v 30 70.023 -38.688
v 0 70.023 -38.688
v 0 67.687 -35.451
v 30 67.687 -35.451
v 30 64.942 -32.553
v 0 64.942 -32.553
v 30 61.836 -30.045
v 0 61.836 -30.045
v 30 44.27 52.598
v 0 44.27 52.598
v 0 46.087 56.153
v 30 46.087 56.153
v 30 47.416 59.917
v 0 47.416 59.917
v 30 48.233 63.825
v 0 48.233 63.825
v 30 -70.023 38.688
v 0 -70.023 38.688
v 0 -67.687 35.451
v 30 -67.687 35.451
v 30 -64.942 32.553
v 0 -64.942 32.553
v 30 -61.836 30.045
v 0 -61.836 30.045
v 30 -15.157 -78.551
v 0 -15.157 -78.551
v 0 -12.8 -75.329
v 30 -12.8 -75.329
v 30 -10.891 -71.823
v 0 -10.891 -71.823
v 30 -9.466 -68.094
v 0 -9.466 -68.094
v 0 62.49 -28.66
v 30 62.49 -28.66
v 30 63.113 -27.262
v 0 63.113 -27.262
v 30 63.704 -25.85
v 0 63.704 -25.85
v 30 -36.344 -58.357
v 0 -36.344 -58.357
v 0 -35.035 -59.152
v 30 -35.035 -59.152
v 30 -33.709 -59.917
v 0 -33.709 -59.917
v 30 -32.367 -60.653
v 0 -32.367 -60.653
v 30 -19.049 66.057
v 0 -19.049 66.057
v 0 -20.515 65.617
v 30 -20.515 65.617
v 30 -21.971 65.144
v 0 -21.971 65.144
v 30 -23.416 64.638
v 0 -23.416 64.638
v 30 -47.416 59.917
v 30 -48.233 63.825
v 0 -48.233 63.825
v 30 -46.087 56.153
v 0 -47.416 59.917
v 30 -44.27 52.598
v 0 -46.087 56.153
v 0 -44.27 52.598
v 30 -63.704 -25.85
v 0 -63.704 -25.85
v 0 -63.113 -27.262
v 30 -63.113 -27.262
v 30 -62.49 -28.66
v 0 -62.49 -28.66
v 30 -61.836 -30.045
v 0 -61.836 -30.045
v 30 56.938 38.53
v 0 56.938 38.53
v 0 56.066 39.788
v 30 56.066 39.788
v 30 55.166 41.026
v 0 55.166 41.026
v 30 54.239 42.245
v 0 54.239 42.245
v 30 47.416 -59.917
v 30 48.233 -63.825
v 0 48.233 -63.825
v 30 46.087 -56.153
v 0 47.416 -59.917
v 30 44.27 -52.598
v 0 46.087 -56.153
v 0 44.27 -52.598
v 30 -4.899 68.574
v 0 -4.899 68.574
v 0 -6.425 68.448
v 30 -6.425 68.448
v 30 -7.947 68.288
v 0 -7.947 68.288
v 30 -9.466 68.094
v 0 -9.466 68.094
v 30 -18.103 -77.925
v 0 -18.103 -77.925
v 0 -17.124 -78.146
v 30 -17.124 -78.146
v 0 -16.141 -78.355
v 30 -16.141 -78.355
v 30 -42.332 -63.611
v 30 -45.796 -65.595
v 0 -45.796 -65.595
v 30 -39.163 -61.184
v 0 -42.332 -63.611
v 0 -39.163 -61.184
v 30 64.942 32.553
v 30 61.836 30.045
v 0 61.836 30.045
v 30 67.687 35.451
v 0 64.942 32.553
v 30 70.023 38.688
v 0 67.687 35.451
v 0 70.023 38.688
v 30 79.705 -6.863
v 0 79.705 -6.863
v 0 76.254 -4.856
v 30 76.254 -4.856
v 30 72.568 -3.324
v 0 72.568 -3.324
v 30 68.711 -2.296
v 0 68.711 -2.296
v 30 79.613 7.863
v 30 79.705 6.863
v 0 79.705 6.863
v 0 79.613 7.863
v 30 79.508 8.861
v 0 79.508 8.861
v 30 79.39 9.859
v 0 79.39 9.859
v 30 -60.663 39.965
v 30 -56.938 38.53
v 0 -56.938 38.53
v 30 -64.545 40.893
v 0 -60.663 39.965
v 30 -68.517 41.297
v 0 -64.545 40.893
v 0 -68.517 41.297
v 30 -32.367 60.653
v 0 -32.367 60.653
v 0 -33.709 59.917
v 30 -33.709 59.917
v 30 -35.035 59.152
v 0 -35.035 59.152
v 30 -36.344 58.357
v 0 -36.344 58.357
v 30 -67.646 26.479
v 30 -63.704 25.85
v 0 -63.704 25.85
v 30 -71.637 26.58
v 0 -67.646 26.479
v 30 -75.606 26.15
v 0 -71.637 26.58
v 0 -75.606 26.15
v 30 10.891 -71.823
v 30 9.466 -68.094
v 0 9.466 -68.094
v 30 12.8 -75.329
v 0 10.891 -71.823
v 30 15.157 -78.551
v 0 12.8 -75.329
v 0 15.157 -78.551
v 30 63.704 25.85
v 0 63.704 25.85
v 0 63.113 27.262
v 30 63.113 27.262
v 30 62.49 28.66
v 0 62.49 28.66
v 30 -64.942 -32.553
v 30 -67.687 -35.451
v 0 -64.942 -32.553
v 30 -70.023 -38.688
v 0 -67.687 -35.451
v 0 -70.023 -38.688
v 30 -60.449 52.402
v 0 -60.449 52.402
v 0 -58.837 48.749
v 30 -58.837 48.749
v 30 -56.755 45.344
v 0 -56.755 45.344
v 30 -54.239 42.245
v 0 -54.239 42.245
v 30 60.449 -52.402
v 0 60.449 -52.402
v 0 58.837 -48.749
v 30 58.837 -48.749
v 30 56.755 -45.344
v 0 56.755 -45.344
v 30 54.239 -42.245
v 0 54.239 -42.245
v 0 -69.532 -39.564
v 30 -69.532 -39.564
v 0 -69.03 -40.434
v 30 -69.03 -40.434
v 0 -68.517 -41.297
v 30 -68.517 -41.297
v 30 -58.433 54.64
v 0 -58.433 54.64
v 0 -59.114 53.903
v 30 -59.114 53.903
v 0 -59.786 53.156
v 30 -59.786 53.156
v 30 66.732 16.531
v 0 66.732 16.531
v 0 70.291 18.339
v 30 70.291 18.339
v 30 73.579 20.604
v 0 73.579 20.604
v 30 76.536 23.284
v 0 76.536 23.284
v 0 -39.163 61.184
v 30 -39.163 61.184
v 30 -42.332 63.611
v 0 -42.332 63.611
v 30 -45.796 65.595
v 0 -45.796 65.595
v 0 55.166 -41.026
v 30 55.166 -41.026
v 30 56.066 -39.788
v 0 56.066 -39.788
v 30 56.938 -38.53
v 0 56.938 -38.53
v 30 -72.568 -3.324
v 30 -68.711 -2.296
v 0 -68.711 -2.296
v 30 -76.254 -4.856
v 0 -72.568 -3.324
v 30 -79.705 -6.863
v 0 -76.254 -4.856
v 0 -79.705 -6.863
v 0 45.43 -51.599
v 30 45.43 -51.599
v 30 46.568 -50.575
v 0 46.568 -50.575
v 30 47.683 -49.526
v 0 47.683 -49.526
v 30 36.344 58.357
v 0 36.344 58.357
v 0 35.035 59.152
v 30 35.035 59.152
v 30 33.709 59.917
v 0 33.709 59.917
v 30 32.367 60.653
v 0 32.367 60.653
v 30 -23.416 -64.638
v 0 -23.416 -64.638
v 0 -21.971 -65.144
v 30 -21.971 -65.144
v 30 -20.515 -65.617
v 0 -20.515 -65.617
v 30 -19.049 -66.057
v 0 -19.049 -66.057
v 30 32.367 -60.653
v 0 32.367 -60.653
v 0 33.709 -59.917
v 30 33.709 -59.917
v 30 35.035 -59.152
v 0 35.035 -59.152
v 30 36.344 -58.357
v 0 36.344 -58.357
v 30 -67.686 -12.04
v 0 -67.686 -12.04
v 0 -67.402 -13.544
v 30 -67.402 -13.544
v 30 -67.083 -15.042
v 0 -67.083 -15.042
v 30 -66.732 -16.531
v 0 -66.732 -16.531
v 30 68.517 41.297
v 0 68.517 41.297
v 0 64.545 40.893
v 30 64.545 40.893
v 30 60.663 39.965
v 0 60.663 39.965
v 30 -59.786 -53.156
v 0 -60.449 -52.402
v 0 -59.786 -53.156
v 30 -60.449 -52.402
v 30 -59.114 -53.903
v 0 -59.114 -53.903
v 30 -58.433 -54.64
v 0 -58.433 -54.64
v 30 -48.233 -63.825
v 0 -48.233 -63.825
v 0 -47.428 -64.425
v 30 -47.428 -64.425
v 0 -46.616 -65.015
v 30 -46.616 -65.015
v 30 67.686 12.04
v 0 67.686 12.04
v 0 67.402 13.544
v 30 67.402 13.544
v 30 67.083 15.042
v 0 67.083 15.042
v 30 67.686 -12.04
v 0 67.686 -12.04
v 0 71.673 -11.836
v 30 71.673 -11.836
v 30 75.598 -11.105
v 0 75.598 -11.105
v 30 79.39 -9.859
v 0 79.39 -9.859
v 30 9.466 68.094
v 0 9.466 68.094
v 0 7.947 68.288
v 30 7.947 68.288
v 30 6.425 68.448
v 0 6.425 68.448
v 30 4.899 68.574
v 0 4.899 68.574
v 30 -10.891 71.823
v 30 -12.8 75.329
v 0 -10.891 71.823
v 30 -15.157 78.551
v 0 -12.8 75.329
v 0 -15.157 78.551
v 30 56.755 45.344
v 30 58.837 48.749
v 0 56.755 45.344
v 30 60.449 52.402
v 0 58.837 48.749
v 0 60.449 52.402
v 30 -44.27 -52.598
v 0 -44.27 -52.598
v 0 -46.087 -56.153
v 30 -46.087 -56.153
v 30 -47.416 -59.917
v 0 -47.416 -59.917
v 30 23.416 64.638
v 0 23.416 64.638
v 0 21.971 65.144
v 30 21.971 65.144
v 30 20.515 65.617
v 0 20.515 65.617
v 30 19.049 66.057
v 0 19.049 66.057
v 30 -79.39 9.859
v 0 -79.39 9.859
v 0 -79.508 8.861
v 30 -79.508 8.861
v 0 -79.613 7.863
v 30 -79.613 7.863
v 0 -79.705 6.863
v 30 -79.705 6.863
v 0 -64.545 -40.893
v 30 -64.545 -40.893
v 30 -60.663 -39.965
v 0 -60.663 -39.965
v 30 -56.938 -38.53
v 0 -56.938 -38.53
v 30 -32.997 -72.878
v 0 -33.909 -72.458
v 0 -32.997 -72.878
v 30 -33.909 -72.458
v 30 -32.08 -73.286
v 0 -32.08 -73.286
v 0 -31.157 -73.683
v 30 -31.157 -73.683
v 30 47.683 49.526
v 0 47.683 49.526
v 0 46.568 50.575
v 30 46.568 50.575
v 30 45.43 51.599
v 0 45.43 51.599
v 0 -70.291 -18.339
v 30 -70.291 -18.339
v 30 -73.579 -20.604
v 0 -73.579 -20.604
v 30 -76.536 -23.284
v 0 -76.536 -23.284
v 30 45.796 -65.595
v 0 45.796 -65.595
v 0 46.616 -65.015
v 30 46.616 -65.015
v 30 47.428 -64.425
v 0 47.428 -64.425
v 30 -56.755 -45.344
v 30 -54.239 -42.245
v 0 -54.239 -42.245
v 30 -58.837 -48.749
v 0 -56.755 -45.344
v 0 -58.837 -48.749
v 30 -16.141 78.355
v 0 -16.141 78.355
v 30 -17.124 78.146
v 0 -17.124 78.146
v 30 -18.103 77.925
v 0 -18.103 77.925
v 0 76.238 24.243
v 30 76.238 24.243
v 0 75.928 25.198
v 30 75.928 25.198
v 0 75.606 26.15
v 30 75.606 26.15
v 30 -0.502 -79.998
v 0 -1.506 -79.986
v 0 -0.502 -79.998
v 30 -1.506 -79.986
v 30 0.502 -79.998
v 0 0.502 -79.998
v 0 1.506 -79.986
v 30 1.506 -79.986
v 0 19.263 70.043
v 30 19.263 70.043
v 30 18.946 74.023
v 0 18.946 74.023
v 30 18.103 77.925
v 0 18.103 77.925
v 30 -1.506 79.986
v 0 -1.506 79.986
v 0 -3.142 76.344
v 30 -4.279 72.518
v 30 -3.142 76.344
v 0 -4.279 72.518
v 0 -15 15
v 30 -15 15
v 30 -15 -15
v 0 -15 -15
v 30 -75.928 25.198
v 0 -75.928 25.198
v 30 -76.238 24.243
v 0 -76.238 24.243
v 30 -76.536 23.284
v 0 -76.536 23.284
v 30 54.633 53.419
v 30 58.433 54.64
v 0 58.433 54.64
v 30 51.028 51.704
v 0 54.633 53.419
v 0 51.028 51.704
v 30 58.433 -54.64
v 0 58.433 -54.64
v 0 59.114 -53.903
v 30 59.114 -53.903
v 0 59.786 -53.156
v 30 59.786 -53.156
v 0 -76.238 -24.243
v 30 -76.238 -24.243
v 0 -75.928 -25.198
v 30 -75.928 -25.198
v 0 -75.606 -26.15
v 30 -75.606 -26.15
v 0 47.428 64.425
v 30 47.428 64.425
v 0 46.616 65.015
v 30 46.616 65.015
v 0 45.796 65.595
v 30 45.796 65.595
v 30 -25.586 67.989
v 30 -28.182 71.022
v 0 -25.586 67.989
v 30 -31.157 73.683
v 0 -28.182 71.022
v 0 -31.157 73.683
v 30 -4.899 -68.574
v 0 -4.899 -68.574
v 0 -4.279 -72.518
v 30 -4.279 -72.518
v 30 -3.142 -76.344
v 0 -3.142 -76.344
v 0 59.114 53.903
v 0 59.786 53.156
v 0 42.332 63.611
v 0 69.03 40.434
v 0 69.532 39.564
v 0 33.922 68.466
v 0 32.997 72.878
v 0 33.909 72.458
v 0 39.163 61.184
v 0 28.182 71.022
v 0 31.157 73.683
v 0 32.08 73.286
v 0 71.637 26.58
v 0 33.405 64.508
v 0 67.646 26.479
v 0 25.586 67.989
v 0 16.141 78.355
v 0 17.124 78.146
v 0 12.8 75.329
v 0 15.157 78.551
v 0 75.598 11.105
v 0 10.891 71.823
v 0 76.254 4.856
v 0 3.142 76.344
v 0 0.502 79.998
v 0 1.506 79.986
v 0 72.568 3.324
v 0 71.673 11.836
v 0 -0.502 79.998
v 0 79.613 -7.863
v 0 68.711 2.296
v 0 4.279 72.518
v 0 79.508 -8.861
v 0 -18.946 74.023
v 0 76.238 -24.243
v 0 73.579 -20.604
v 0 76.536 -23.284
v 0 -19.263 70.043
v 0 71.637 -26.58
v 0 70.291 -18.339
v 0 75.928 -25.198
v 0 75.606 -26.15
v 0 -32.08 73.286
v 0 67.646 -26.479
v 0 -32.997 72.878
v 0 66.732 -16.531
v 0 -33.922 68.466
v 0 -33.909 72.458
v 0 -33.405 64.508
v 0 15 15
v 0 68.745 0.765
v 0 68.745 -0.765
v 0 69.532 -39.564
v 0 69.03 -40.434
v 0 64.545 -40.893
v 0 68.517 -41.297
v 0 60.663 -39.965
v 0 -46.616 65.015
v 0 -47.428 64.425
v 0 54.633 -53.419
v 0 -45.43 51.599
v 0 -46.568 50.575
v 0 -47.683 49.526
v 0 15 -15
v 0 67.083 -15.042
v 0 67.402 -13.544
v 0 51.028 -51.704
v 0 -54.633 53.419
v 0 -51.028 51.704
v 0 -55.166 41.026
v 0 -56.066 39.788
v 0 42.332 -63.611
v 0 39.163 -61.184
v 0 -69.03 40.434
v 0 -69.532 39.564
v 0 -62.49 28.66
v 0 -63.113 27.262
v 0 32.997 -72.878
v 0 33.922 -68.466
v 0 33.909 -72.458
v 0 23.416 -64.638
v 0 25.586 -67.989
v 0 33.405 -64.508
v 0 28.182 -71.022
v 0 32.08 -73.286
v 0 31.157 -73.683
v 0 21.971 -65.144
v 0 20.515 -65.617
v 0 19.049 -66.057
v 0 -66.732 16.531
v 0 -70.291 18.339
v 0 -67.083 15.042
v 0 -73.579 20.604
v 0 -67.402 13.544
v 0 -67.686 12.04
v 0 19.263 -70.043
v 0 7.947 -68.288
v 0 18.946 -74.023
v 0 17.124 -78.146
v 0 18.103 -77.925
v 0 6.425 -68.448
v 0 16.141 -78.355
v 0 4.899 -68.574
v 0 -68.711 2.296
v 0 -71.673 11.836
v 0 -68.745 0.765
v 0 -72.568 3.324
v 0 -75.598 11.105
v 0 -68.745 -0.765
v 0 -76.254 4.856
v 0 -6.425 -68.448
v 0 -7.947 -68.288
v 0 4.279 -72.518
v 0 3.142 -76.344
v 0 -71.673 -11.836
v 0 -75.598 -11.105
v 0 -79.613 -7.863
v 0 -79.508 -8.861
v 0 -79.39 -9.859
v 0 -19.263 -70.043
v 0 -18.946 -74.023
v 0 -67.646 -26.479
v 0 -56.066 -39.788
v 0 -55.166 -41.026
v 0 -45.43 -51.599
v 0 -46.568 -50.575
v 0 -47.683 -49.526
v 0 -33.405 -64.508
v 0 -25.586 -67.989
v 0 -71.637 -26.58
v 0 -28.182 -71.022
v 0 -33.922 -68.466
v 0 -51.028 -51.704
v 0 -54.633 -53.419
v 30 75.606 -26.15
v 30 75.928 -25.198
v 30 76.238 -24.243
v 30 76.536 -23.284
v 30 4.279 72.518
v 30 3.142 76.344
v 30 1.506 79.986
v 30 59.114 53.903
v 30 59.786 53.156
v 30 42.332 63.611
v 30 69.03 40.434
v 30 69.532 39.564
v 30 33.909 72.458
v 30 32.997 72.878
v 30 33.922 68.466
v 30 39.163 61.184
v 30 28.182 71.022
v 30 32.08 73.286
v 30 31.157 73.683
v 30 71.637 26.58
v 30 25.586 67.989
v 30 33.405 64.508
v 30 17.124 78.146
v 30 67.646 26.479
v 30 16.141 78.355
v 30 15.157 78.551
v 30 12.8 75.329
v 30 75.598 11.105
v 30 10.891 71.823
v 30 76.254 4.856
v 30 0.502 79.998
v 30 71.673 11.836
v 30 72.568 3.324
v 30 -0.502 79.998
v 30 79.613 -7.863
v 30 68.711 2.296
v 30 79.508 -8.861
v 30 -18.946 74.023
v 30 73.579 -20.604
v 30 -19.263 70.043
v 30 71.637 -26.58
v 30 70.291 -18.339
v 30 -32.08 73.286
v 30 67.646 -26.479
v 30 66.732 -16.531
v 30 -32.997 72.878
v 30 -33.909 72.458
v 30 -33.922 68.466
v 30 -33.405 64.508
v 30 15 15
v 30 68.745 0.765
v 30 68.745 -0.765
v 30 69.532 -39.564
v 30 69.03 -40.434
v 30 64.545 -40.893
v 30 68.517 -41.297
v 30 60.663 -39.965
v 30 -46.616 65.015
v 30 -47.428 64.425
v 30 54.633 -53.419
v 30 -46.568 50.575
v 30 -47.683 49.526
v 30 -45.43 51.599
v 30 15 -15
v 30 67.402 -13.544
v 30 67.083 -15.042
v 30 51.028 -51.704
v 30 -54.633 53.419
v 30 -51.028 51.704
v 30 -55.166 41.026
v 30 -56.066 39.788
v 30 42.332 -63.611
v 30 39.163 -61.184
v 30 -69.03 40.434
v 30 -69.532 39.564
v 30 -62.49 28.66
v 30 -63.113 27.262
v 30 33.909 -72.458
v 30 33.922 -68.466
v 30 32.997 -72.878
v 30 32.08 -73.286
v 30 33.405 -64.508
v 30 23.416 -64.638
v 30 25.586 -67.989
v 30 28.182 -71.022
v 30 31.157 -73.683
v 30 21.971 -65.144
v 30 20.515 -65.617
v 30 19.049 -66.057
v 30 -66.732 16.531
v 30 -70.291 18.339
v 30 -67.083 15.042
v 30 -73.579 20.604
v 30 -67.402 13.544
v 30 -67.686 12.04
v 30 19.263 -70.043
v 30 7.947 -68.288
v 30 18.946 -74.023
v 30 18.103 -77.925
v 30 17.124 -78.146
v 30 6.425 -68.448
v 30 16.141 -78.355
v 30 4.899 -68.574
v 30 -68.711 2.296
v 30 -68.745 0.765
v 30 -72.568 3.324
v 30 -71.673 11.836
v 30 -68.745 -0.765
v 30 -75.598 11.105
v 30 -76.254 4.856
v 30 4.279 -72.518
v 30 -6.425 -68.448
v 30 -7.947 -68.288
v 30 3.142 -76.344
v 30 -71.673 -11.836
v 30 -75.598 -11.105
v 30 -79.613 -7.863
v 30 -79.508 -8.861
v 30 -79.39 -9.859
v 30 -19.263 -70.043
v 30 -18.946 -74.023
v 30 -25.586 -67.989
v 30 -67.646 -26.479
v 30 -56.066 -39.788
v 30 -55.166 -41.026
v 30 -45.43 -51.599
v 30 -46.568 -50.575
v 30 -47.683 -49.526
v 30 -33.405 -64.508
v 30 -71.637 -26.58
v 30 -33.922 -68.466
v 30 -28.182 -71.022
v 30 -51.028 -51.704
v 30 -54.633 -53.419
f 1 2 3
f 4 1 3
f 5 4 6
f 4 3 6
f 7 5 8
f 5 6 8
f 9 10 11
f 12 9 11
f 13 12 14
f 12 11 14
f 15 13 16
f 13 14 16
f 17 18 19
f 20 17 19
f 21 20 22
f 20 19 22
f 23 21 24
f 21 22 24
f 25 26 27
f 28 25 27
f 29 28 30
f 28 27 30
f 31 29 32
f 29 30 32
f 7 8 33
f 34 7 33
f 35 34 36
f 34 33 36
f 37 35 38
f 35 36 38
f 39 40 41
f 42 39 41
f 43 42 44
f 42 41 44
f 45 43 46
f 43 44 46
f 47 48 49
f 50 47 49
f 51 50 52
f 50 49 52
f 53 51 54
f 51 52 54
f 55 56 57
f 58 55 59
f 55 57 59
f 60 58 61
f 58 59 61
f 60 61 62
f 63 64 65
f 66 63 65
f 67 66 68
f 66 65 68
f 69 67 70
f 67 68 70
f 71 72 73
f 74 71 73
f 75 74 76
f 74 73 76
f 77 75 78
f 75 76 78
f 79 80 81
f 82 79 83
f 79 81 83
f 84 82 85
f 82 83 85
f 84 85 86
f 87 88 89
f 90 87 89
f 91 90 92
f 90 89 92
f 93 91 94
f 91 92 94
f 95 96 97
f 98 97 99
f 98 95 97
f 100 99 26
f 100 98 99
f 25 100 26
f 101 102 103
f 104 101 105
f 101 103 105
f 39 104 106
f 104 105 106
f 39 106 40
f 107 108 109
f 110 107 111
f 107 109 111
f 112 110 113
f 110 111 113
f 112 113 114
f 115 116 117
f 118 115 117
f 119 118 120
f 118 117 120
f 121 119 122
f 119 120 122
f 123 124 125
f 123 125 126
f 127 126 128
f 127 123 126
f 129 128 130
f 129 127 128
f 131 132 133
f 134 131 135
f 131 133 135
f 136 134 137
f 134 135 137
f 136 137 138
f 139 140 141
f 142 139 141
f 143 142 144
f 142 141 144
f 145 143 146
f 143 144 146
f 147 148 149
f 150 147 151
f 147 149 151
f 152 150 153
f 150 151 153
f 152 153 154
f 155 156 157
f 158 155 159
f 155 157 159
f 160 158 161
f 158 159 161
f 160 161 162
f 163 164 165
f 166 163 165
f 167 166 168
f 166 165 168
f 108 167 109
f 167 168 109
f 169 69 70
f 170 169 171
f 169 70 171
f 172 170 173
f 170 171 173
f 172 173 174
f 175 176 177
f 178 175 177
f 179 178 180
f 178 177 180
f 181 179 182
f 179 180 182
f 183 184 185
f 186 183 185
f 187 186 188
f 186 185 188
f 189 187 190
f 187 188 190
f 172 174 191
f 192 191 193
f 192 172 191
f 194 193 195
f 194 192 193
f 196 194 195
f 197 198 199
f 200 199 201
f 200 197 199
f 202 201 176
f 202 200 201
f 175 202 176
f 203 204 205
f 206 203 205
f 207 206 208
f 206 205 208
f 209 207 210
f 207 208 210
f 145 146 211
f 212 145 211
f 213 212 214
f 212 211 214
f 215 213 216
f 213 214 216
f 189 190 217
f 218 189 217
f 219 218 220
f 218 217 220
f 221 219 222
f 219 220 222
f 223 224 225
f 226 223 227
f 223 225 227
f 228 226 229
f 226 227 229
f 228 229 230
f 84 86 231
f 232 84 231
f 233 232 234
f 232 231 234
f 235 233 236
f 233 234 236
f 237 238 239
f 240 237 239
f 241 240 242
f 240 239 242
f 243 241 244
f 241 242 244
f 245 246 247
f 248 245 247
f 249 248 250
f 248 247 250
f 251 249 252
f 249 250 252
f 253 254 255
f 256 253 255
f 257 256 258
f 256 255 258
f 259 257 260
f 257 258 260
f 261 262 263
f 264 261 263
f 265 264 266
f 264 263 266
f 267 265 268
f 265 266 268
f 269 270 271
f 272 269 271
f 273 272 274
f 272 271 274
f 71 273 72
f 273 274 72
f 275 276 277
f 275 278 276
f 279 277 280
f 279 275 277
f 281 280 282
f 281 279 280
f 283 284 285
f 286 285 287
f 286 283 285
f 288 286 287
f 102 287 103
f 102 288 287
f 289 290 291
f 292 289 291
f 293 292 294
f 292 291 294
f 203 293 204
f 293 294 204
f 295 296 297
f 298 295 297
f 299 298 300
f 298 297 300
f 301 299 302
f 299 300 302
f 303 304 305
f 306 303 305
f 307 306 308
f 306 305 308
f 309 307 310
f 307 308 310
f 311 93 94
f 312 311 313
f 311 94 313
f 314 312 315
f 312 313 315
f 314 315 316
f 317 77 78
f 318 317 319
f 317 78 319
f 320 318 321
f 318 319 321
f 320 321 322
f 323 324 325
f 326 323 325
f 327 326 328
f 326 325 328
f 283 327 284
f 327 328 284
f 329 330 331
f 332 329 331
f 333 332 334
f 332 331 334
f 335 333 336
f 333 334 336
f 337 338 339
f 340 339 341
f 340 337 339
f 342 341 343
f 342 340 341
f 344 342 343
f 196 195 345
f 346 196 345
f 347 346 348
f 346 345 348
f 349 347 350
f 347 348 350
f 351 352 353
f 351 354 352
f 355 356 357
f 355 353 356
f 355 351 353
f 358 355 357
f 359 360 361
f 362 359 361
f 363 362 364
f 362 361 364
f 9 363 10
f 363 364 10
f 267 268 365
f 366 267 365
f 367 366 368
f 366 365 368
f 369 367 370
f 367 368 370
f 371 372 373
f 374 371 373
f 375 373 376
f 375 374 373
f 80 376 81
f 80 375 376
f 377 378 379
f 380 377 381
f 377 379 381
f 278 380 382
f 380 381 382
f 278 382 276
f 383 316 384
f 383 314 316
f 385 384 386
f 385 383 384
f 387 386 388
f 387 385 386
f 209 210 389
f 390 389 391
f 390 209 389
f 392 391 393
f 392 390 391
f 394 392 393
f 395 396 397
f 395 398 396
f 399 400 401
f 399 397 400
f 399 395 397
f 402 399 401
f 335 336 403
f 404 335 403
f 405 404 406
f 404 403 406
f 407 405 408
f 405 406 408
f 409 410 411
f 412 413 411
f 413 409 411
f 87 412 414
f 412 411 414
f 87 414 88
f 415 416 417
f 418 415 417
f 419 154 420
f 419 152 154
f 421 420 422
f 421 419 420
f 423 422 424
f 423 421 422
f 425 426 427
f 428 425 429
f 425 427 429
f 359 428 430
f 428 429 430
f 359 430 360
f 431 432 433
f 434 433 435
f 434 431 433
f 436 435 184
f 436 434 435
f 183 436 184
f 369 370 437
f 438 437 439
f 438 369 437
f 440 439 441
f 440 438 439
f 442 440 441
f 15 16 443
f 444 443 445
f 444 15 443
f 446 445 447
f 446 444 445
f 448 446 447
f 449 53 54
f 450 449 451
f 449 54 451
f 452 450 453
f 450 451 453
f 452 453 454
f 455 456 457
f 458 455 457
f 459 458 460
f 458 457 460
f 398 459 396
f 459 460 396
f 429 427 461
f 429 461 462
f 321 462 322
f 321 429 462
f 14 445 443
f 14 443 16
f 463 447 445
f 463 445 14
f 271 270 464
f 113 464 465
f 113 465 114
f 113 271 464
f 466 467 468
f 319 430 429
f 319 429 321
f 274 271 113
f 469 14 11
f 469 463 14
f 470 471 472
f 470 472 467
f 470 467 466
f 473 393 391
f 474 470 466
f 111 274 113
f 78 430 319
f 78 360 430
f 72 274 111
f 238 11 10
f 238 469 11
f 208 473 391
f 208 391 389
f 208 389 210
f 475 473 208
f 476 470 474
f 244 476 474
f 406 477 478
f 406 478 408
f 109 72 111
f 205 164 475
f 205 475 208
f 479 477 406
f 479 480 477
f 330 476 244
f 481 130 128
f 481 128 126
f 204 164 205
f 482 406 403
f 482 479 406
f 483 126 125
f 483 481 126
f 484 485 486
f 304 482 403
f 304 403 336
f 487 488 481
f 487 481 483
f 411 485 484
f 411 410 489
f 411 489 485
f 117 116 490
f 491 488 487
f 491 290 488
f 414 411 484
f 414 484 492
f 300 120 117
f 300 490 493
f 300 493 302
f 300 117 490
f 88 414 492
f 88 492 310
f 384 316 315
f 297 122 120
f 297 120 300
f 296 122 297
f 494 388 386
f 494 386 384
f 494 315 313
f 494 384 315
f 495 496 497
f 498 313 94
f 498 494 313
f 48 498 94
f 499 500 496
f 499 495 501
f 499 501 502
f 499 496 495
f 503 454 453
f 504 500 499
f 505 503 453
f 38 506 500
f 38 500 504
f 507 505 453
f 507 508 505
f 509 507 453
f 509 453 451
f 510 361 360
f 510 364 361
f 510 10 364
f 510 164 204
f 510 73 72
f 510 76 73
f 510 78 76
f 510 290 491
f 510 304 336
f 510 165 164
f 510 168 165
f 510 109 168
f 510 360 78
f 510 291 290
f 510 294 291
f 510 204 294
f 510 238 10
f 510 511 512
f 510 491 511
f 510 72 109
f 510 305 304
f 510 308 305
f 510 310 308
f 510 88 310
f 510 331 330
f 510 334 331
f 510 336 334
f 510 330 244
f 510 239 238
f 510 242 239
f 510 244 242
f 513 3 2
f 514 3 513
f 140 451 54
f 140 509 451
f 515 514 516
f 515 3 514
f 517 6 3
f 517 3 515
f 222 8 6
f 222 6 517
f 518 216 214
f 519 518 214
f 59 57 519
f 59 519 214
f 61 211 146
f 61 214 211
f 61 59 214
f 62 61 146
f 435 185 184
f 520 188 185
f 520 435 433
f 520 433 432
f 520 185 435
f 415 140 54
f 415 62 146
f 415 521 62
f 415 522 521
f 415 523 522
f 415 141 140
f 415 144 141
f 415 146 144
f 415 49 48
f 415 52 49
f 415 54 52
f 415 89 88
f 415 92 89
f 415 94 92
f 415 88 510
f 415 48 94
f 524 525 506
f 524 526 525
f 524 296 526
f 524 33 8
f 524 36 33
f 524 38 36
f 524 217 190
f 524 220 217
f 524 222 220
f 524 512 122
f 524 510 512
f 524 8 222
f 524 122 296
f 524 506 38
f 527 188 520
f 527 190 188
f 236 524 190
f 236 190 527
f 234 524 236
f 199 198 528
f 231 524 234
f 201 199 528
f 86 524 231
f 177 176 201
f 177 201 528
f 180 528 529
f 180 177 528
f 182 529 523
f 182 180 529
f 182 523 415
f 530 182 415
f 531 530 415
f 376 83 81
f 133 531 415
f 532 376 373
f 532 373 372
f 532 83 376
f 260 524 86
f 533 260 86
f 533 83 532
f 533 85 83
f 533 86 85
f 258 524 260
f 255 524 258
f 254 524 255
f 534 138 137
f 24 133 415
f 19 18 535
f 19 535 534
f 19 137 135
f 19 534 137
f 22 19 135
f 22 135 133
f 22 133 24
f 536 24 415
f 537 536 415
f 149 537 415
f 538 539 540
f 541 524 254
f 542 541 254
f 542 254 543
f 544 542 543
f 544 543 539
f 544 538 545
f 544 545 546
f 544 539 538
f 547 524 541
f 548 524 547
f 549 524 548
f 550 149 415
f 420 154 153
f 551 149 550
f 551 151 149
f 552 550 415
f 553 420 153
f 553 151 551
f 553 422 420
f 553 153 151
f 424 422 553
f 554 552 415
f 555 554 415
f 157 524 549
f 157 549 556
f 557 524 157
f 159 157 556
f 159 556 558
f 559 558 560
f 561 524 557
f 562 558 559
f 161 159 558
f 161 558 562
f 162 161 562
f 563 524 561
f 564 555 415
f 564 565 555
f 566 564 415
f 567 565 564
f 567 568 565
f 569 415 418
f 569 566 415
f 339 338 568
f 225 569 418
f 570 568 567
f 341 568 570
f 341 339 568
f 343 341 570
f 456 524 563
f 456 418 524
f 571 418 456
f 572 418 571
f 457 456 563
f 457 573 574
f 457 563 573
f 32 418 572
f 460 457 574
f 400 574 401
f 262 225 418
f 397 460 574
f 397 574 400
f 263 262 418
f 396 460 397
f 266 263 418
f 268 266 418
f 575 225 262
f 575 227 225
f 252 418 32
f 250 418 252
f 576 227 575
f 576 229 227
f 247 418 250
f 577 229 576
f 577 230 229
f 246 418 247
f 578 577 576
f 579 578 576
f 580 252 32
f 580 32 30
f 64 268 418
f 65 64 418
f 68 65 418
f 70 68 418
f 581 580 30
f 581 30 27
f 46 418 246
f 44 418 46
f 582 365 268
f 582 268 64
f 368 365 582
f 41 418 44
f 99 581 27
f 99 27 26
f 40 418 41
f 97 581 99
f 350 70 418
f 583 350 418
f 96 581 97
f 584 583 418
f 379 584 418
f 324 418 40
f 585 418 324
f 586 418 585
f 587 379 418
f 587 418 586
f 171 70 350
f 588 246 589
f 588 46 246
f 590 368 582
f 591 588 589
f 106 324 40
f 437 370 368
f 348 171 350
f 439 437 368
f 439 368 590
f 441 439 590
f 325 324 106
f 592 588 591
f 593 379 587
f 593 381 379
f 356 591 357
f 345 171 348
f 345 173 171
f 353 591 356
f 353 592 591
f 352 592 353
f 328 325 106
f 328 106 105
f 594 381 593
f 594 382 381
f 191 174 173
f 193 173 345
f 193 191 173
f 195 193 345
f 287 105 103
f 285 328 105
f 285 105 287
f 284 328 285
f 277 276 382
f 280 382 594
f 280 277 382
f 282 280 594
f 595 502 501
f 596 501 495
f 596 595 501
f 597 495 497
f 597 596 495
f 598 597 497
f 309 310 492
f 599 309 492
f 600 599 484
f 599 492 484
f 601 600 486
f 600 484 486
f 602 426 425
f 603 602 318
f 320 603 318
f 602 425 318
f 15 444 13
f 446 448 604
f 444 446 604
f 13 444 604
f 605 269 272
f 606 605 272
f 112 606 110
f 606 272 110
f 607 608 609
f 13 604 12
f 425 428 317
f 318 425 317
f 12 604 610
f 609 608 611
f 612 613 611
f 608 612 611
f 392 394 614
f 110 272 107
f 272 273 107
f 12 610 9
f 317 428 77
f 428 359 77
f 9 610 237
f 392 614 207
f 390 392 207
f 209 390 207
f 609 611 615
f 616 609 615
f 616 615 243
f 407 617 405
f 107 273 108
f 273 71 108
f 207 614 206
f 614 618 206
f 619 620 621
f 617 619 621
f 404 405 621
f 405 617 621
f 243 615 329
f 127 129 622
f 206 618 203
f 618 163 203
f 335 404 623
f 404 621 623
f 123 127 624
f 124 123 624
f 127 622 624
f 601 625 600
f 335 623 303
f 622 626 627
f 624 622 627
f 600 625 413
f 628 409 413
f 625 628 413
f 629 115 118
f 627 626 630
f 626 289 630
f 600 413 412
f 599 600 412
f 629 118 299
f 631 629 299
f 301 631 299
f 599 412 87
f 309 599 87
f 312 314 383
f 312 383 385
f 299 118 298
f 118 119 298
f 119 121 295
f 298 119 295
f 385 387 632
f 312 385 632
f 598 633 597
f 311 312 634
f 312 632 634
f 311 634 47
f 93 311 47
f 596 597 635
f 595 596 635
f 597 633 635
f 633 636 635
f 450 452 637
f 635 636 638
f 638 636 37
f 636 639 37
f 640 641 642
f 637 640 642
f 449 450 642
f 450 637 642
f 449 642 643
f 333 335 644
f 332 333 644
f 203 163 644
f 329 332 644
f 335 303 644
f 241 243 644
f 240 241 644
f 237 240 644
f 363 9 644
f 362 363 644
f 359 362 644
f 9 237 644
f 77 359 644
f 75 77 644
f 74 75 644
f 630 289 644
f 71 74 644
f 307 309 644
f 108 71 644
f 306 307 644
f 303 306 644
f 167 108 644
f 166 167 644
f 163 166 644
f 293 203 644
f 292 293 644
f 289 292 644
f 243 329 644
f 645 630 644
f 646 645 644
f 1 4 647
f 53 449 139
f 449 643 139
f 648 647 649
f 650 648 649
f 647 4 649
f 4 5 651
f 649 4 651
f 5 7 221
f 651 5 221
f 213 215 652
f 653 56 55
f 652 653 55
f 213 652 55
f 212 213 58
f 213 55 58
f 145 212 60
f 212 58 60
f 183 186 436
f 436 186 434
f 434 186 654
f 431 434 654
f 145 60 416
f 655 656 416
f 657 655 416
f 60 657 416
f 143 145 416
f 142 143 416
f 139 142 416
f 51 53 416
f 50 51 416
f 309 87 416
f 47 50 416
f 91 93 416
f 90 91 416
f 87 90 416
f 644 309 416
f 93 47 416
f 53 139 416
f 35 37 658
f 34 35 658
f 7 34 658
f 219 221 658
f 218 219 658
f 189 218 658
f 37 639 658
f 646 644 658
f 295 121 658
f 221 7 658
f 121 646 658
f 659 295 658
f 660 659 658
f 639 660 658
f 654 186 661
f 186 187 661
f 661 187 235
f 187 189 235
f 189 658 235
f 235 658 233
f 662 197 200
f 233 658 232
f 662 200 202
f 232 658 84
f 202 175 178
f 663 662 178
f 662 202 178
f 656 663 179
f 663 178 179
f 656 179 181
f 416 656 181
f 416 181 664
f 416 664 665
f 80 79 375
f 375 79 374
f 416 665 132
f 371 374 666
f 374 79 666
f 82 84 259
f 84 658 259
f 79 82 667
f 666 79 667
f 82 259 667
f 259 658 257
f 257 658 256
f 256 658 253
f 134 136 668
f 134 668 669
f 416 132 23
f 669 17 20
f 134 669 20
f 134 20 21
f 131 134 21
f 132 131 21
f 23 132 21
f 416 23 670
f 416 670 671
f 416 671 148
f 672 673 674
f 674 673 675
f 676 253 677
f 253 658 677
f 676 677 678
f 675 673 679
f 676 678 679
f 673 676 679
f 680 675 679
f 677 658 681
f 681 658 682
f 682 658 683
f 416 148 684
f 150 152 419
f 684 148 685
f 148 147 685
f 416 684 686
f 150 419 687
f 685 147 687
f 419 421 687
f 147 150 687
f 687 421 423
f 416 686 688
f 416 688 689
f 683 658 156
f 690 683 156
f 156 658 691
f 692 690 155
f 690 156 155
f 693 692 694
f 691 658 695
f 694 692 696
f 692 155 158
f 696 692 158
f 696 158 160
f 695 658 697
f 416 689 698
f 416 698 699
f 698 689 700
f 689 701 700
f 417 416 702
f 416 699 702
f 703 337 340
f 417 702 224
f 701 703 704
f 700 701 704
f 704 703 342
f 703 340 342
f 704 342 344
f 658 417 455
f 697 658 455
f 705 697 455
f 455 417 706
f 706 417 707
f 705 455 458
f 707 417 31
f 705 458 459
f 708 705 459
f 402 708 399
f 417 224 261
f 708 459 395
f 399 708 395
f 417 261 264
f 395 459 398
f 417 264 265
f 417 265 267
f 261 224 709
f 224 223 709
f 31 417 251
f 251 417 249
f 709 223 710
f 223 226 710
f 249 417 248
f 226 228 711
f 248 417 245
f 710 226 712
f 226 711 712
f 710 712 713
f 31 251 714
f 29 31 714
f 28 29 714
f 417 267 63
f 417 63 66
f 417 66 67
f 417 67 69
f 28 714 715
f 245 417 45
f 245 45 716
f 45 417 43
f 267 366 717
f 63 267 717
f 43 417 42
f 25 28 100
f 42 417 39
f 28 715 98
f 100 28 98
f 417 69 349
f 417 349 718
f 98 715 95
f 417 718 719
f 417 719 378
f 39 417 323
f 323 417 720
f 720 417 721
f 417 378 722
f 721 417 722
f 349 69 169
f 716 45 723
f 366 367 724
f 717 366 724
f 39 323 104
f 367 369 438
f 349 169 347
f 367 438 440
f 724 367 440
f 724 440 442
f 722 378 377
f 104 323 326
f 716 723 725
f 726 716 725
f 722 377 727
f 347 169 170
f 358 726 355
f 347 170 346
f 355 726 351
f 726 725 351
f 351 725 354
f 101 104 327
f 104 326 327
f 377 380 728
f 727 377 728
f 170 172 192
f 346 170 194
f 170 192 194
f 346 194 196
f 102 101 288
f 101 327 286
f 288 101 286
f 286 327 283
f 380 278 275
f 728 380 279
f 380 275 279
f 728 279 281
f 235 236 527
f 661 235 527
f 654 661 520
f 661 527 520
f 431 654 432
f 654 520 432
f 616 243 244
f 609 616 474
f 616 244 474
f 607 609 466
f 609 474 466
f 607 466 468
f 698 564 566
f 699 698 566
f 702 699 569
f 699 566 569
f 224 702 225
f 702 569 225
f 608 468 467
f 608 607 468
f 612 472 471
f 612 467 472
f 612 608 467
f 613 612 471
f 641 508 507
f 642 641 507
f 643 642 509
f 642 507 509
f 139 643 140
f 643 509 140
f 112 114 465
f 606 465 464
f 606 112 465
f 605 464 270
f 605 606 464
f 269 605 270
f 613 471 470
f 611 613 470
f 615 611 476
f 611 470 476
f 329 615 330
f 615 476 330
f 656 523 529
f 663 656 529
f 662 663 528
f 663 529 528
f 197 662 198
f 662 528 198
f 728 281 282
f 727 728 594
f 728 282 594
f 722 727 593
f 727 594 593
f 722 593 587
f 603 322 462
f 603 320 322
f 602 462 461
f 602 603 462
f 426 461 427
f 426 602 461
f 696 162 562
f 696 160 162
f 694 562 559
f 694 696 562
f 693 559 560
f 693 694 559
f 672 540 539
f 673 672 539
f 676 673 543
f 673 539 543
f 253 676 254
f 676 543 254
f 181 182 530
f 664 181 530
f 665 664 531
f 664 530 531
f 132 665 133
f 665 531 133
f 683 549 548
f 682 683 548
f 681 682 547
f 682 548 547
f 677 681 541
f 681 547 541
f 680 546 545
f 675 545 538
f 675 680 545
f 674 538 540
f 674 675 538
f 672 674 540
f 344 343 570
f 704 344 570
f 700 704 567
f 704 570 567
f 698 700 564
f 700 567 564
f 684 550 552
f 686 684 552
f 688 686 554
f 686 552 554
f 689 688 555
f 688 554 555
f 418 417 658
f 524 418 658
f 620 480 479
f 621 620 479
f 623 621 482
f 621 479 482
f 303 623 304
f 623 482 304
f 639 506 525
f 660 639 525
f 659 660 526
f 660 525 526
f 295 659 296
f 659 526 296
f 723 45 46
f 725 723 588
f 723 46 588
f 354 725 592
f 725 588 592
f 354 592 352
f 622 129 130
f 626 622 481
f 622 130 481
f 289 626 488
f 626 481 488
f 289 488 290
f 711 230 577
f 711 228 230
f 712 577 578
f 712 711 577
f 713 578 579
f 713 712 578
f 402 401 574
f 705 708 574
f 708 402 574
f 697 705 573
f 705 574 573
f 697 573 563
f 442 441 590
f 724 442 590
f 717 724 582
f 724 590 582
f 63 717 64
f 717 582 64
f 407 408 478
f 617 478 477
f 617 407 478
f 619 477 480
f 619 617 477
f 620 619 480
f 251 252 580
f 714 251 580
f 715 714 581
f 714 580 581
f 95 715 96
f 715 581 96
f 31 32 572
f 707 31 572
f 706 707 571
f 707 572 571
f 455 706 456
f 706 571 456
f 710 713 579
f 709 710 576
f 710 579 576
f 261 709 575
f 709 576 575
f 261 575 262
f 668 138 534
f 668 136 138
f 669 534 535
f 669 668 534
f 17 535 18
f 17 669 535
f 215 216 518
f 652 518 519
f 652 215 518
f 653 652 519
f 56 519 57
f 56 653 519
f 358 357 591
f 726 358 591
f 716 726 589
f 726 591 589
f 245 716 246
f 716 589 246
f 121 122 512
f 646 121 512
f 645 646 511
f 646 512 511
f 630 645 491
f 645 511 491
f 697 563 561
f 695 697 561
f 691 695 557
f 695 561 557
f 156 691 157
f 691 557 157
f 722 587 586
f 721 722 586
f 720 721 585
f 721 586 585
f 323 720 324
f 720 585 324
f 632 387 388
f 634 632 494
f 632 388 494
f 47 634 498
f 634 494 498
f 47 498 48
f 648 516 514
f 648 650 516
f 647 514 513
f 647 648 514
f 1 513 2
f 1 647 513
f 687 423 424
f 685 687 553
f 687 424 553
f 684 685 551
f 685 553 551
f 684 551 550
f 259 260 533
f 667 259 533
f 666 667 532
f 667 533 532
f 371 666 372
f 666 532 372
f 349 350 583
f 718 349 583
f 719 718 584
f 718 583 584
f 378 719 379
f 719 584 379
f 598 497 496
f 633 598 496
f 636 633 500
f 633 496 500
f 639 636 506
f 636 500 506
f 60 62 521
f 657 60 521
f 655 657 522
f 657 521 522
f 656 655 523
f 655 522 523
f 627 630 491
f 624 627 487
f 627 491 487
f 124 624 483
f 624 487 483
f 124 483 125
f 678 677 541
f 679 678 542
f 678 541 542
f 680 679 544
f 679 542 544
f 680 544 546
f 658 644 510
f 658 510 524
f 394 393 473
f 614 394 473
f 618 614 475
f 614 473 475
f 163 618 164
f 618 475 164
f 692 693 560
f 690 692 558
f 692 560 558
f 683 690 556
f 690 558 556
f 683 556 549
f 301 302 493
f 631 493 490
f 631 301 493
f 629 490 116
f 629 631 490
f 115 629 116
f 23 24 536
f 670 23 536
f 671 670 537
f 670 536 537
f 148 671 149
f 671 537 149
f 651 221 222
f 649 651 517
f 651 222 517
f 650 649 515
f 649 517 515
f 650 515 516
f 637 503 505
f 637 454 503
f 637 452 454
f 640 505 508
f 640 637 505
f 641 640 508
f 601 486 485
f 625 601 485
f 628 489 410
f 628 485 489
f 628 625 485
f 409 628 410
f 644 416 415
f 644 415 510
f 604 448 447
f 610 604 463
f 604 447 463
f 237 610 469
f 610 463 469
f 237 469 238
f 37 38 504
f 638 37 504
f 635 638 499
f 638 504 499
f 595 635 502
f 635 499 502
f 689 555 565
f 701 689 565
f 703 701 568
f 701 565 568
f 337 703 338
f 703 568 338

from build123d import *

# Parameters (mm, degrees)
BASPROSKE_W     = 30
BASPROSKE_H     = 80
TOOTHCUT_DEPTH  = 118.046999107
TEETHCUTS_COUNT = 30
TEETHCUTS_ANGLE = 348
BORSKE_W        = 30
BORSKE_H        = 30
BORE_DEPTH      = 50.0000508


with BuildPart() as part:
    # BasProSke → Base-Revolve (revolve)
    with BuildSketch(Plane(origin=(0, 0, 0), x_dir=(1, 0, 0), z_dir=(0, 1, 0)), mode=Mode.PRIVATE) as base_revolve_sk:
        with Locations((15, 40)):
            Rectangle(BASPROSKE_W, BASPROSKE_H)
    revolve(base_revolve_sk.sketch.rotate(Axis((-10, 0, 0), (1, 0, 0)), 180), axis=Axis((-10, 0, 0), (1, 0, 0)))

    # TooCutSke → ToothCut (cut, through all)
    with BuildSketch(Plane(origin=(0, 0, 0), x_dir=(0, 0, -1), z_dir=(1, 0, 0))):
        with BuildLine():
            ThreePointArc((2.295869197, 68.710654091), (0, 68.749), (-2.295869197, 68.710654091))
            ThreePointArc((-2.295869197, 68.710654091), (-4.034057509, 74.450113805), (-6.879070213, 79.729185611))
            ThreePointArc((-6.879070213, 79.729185611), (0, 80.0254), (6.879070213, 79.729185611))
            ThreePointArc((6.879070213, 79.729185611), (4.034057509, 74.450113805), (2.295869197, 68.710654091))
        make_face()
    toothcut = extrude(amount=TOOTHCUT_DEPTH, mode=Mode.SUBTRACT)

    # TeethCuts: ToothCut ×30 about axis
    teethcuts_axis = Axis((-10, 0, 0), (1, 0, 0))
    for i in range(1, TEETHCUTS_COUNT):
        add(toothcut.rotate(teethcuts_axis, i * TEETHCUTS_ANGLE / (TEETHCUTS_COUNT - 1)), mode=Mode.SUBTRACT)

    # BorSke → Bore (cut, symmetric)
    with BuildSketch(Plane(origin=(0, 0, 0), x_dir=(0, 0, -1), z_dir=(1, 0, 0))):
        Rectangle(BORSKE_W, BORSKE_H)
    extrude(amount=BORE_DEPTH, both=True, mode=Mode.SUBTRACT)


solid = part.part
